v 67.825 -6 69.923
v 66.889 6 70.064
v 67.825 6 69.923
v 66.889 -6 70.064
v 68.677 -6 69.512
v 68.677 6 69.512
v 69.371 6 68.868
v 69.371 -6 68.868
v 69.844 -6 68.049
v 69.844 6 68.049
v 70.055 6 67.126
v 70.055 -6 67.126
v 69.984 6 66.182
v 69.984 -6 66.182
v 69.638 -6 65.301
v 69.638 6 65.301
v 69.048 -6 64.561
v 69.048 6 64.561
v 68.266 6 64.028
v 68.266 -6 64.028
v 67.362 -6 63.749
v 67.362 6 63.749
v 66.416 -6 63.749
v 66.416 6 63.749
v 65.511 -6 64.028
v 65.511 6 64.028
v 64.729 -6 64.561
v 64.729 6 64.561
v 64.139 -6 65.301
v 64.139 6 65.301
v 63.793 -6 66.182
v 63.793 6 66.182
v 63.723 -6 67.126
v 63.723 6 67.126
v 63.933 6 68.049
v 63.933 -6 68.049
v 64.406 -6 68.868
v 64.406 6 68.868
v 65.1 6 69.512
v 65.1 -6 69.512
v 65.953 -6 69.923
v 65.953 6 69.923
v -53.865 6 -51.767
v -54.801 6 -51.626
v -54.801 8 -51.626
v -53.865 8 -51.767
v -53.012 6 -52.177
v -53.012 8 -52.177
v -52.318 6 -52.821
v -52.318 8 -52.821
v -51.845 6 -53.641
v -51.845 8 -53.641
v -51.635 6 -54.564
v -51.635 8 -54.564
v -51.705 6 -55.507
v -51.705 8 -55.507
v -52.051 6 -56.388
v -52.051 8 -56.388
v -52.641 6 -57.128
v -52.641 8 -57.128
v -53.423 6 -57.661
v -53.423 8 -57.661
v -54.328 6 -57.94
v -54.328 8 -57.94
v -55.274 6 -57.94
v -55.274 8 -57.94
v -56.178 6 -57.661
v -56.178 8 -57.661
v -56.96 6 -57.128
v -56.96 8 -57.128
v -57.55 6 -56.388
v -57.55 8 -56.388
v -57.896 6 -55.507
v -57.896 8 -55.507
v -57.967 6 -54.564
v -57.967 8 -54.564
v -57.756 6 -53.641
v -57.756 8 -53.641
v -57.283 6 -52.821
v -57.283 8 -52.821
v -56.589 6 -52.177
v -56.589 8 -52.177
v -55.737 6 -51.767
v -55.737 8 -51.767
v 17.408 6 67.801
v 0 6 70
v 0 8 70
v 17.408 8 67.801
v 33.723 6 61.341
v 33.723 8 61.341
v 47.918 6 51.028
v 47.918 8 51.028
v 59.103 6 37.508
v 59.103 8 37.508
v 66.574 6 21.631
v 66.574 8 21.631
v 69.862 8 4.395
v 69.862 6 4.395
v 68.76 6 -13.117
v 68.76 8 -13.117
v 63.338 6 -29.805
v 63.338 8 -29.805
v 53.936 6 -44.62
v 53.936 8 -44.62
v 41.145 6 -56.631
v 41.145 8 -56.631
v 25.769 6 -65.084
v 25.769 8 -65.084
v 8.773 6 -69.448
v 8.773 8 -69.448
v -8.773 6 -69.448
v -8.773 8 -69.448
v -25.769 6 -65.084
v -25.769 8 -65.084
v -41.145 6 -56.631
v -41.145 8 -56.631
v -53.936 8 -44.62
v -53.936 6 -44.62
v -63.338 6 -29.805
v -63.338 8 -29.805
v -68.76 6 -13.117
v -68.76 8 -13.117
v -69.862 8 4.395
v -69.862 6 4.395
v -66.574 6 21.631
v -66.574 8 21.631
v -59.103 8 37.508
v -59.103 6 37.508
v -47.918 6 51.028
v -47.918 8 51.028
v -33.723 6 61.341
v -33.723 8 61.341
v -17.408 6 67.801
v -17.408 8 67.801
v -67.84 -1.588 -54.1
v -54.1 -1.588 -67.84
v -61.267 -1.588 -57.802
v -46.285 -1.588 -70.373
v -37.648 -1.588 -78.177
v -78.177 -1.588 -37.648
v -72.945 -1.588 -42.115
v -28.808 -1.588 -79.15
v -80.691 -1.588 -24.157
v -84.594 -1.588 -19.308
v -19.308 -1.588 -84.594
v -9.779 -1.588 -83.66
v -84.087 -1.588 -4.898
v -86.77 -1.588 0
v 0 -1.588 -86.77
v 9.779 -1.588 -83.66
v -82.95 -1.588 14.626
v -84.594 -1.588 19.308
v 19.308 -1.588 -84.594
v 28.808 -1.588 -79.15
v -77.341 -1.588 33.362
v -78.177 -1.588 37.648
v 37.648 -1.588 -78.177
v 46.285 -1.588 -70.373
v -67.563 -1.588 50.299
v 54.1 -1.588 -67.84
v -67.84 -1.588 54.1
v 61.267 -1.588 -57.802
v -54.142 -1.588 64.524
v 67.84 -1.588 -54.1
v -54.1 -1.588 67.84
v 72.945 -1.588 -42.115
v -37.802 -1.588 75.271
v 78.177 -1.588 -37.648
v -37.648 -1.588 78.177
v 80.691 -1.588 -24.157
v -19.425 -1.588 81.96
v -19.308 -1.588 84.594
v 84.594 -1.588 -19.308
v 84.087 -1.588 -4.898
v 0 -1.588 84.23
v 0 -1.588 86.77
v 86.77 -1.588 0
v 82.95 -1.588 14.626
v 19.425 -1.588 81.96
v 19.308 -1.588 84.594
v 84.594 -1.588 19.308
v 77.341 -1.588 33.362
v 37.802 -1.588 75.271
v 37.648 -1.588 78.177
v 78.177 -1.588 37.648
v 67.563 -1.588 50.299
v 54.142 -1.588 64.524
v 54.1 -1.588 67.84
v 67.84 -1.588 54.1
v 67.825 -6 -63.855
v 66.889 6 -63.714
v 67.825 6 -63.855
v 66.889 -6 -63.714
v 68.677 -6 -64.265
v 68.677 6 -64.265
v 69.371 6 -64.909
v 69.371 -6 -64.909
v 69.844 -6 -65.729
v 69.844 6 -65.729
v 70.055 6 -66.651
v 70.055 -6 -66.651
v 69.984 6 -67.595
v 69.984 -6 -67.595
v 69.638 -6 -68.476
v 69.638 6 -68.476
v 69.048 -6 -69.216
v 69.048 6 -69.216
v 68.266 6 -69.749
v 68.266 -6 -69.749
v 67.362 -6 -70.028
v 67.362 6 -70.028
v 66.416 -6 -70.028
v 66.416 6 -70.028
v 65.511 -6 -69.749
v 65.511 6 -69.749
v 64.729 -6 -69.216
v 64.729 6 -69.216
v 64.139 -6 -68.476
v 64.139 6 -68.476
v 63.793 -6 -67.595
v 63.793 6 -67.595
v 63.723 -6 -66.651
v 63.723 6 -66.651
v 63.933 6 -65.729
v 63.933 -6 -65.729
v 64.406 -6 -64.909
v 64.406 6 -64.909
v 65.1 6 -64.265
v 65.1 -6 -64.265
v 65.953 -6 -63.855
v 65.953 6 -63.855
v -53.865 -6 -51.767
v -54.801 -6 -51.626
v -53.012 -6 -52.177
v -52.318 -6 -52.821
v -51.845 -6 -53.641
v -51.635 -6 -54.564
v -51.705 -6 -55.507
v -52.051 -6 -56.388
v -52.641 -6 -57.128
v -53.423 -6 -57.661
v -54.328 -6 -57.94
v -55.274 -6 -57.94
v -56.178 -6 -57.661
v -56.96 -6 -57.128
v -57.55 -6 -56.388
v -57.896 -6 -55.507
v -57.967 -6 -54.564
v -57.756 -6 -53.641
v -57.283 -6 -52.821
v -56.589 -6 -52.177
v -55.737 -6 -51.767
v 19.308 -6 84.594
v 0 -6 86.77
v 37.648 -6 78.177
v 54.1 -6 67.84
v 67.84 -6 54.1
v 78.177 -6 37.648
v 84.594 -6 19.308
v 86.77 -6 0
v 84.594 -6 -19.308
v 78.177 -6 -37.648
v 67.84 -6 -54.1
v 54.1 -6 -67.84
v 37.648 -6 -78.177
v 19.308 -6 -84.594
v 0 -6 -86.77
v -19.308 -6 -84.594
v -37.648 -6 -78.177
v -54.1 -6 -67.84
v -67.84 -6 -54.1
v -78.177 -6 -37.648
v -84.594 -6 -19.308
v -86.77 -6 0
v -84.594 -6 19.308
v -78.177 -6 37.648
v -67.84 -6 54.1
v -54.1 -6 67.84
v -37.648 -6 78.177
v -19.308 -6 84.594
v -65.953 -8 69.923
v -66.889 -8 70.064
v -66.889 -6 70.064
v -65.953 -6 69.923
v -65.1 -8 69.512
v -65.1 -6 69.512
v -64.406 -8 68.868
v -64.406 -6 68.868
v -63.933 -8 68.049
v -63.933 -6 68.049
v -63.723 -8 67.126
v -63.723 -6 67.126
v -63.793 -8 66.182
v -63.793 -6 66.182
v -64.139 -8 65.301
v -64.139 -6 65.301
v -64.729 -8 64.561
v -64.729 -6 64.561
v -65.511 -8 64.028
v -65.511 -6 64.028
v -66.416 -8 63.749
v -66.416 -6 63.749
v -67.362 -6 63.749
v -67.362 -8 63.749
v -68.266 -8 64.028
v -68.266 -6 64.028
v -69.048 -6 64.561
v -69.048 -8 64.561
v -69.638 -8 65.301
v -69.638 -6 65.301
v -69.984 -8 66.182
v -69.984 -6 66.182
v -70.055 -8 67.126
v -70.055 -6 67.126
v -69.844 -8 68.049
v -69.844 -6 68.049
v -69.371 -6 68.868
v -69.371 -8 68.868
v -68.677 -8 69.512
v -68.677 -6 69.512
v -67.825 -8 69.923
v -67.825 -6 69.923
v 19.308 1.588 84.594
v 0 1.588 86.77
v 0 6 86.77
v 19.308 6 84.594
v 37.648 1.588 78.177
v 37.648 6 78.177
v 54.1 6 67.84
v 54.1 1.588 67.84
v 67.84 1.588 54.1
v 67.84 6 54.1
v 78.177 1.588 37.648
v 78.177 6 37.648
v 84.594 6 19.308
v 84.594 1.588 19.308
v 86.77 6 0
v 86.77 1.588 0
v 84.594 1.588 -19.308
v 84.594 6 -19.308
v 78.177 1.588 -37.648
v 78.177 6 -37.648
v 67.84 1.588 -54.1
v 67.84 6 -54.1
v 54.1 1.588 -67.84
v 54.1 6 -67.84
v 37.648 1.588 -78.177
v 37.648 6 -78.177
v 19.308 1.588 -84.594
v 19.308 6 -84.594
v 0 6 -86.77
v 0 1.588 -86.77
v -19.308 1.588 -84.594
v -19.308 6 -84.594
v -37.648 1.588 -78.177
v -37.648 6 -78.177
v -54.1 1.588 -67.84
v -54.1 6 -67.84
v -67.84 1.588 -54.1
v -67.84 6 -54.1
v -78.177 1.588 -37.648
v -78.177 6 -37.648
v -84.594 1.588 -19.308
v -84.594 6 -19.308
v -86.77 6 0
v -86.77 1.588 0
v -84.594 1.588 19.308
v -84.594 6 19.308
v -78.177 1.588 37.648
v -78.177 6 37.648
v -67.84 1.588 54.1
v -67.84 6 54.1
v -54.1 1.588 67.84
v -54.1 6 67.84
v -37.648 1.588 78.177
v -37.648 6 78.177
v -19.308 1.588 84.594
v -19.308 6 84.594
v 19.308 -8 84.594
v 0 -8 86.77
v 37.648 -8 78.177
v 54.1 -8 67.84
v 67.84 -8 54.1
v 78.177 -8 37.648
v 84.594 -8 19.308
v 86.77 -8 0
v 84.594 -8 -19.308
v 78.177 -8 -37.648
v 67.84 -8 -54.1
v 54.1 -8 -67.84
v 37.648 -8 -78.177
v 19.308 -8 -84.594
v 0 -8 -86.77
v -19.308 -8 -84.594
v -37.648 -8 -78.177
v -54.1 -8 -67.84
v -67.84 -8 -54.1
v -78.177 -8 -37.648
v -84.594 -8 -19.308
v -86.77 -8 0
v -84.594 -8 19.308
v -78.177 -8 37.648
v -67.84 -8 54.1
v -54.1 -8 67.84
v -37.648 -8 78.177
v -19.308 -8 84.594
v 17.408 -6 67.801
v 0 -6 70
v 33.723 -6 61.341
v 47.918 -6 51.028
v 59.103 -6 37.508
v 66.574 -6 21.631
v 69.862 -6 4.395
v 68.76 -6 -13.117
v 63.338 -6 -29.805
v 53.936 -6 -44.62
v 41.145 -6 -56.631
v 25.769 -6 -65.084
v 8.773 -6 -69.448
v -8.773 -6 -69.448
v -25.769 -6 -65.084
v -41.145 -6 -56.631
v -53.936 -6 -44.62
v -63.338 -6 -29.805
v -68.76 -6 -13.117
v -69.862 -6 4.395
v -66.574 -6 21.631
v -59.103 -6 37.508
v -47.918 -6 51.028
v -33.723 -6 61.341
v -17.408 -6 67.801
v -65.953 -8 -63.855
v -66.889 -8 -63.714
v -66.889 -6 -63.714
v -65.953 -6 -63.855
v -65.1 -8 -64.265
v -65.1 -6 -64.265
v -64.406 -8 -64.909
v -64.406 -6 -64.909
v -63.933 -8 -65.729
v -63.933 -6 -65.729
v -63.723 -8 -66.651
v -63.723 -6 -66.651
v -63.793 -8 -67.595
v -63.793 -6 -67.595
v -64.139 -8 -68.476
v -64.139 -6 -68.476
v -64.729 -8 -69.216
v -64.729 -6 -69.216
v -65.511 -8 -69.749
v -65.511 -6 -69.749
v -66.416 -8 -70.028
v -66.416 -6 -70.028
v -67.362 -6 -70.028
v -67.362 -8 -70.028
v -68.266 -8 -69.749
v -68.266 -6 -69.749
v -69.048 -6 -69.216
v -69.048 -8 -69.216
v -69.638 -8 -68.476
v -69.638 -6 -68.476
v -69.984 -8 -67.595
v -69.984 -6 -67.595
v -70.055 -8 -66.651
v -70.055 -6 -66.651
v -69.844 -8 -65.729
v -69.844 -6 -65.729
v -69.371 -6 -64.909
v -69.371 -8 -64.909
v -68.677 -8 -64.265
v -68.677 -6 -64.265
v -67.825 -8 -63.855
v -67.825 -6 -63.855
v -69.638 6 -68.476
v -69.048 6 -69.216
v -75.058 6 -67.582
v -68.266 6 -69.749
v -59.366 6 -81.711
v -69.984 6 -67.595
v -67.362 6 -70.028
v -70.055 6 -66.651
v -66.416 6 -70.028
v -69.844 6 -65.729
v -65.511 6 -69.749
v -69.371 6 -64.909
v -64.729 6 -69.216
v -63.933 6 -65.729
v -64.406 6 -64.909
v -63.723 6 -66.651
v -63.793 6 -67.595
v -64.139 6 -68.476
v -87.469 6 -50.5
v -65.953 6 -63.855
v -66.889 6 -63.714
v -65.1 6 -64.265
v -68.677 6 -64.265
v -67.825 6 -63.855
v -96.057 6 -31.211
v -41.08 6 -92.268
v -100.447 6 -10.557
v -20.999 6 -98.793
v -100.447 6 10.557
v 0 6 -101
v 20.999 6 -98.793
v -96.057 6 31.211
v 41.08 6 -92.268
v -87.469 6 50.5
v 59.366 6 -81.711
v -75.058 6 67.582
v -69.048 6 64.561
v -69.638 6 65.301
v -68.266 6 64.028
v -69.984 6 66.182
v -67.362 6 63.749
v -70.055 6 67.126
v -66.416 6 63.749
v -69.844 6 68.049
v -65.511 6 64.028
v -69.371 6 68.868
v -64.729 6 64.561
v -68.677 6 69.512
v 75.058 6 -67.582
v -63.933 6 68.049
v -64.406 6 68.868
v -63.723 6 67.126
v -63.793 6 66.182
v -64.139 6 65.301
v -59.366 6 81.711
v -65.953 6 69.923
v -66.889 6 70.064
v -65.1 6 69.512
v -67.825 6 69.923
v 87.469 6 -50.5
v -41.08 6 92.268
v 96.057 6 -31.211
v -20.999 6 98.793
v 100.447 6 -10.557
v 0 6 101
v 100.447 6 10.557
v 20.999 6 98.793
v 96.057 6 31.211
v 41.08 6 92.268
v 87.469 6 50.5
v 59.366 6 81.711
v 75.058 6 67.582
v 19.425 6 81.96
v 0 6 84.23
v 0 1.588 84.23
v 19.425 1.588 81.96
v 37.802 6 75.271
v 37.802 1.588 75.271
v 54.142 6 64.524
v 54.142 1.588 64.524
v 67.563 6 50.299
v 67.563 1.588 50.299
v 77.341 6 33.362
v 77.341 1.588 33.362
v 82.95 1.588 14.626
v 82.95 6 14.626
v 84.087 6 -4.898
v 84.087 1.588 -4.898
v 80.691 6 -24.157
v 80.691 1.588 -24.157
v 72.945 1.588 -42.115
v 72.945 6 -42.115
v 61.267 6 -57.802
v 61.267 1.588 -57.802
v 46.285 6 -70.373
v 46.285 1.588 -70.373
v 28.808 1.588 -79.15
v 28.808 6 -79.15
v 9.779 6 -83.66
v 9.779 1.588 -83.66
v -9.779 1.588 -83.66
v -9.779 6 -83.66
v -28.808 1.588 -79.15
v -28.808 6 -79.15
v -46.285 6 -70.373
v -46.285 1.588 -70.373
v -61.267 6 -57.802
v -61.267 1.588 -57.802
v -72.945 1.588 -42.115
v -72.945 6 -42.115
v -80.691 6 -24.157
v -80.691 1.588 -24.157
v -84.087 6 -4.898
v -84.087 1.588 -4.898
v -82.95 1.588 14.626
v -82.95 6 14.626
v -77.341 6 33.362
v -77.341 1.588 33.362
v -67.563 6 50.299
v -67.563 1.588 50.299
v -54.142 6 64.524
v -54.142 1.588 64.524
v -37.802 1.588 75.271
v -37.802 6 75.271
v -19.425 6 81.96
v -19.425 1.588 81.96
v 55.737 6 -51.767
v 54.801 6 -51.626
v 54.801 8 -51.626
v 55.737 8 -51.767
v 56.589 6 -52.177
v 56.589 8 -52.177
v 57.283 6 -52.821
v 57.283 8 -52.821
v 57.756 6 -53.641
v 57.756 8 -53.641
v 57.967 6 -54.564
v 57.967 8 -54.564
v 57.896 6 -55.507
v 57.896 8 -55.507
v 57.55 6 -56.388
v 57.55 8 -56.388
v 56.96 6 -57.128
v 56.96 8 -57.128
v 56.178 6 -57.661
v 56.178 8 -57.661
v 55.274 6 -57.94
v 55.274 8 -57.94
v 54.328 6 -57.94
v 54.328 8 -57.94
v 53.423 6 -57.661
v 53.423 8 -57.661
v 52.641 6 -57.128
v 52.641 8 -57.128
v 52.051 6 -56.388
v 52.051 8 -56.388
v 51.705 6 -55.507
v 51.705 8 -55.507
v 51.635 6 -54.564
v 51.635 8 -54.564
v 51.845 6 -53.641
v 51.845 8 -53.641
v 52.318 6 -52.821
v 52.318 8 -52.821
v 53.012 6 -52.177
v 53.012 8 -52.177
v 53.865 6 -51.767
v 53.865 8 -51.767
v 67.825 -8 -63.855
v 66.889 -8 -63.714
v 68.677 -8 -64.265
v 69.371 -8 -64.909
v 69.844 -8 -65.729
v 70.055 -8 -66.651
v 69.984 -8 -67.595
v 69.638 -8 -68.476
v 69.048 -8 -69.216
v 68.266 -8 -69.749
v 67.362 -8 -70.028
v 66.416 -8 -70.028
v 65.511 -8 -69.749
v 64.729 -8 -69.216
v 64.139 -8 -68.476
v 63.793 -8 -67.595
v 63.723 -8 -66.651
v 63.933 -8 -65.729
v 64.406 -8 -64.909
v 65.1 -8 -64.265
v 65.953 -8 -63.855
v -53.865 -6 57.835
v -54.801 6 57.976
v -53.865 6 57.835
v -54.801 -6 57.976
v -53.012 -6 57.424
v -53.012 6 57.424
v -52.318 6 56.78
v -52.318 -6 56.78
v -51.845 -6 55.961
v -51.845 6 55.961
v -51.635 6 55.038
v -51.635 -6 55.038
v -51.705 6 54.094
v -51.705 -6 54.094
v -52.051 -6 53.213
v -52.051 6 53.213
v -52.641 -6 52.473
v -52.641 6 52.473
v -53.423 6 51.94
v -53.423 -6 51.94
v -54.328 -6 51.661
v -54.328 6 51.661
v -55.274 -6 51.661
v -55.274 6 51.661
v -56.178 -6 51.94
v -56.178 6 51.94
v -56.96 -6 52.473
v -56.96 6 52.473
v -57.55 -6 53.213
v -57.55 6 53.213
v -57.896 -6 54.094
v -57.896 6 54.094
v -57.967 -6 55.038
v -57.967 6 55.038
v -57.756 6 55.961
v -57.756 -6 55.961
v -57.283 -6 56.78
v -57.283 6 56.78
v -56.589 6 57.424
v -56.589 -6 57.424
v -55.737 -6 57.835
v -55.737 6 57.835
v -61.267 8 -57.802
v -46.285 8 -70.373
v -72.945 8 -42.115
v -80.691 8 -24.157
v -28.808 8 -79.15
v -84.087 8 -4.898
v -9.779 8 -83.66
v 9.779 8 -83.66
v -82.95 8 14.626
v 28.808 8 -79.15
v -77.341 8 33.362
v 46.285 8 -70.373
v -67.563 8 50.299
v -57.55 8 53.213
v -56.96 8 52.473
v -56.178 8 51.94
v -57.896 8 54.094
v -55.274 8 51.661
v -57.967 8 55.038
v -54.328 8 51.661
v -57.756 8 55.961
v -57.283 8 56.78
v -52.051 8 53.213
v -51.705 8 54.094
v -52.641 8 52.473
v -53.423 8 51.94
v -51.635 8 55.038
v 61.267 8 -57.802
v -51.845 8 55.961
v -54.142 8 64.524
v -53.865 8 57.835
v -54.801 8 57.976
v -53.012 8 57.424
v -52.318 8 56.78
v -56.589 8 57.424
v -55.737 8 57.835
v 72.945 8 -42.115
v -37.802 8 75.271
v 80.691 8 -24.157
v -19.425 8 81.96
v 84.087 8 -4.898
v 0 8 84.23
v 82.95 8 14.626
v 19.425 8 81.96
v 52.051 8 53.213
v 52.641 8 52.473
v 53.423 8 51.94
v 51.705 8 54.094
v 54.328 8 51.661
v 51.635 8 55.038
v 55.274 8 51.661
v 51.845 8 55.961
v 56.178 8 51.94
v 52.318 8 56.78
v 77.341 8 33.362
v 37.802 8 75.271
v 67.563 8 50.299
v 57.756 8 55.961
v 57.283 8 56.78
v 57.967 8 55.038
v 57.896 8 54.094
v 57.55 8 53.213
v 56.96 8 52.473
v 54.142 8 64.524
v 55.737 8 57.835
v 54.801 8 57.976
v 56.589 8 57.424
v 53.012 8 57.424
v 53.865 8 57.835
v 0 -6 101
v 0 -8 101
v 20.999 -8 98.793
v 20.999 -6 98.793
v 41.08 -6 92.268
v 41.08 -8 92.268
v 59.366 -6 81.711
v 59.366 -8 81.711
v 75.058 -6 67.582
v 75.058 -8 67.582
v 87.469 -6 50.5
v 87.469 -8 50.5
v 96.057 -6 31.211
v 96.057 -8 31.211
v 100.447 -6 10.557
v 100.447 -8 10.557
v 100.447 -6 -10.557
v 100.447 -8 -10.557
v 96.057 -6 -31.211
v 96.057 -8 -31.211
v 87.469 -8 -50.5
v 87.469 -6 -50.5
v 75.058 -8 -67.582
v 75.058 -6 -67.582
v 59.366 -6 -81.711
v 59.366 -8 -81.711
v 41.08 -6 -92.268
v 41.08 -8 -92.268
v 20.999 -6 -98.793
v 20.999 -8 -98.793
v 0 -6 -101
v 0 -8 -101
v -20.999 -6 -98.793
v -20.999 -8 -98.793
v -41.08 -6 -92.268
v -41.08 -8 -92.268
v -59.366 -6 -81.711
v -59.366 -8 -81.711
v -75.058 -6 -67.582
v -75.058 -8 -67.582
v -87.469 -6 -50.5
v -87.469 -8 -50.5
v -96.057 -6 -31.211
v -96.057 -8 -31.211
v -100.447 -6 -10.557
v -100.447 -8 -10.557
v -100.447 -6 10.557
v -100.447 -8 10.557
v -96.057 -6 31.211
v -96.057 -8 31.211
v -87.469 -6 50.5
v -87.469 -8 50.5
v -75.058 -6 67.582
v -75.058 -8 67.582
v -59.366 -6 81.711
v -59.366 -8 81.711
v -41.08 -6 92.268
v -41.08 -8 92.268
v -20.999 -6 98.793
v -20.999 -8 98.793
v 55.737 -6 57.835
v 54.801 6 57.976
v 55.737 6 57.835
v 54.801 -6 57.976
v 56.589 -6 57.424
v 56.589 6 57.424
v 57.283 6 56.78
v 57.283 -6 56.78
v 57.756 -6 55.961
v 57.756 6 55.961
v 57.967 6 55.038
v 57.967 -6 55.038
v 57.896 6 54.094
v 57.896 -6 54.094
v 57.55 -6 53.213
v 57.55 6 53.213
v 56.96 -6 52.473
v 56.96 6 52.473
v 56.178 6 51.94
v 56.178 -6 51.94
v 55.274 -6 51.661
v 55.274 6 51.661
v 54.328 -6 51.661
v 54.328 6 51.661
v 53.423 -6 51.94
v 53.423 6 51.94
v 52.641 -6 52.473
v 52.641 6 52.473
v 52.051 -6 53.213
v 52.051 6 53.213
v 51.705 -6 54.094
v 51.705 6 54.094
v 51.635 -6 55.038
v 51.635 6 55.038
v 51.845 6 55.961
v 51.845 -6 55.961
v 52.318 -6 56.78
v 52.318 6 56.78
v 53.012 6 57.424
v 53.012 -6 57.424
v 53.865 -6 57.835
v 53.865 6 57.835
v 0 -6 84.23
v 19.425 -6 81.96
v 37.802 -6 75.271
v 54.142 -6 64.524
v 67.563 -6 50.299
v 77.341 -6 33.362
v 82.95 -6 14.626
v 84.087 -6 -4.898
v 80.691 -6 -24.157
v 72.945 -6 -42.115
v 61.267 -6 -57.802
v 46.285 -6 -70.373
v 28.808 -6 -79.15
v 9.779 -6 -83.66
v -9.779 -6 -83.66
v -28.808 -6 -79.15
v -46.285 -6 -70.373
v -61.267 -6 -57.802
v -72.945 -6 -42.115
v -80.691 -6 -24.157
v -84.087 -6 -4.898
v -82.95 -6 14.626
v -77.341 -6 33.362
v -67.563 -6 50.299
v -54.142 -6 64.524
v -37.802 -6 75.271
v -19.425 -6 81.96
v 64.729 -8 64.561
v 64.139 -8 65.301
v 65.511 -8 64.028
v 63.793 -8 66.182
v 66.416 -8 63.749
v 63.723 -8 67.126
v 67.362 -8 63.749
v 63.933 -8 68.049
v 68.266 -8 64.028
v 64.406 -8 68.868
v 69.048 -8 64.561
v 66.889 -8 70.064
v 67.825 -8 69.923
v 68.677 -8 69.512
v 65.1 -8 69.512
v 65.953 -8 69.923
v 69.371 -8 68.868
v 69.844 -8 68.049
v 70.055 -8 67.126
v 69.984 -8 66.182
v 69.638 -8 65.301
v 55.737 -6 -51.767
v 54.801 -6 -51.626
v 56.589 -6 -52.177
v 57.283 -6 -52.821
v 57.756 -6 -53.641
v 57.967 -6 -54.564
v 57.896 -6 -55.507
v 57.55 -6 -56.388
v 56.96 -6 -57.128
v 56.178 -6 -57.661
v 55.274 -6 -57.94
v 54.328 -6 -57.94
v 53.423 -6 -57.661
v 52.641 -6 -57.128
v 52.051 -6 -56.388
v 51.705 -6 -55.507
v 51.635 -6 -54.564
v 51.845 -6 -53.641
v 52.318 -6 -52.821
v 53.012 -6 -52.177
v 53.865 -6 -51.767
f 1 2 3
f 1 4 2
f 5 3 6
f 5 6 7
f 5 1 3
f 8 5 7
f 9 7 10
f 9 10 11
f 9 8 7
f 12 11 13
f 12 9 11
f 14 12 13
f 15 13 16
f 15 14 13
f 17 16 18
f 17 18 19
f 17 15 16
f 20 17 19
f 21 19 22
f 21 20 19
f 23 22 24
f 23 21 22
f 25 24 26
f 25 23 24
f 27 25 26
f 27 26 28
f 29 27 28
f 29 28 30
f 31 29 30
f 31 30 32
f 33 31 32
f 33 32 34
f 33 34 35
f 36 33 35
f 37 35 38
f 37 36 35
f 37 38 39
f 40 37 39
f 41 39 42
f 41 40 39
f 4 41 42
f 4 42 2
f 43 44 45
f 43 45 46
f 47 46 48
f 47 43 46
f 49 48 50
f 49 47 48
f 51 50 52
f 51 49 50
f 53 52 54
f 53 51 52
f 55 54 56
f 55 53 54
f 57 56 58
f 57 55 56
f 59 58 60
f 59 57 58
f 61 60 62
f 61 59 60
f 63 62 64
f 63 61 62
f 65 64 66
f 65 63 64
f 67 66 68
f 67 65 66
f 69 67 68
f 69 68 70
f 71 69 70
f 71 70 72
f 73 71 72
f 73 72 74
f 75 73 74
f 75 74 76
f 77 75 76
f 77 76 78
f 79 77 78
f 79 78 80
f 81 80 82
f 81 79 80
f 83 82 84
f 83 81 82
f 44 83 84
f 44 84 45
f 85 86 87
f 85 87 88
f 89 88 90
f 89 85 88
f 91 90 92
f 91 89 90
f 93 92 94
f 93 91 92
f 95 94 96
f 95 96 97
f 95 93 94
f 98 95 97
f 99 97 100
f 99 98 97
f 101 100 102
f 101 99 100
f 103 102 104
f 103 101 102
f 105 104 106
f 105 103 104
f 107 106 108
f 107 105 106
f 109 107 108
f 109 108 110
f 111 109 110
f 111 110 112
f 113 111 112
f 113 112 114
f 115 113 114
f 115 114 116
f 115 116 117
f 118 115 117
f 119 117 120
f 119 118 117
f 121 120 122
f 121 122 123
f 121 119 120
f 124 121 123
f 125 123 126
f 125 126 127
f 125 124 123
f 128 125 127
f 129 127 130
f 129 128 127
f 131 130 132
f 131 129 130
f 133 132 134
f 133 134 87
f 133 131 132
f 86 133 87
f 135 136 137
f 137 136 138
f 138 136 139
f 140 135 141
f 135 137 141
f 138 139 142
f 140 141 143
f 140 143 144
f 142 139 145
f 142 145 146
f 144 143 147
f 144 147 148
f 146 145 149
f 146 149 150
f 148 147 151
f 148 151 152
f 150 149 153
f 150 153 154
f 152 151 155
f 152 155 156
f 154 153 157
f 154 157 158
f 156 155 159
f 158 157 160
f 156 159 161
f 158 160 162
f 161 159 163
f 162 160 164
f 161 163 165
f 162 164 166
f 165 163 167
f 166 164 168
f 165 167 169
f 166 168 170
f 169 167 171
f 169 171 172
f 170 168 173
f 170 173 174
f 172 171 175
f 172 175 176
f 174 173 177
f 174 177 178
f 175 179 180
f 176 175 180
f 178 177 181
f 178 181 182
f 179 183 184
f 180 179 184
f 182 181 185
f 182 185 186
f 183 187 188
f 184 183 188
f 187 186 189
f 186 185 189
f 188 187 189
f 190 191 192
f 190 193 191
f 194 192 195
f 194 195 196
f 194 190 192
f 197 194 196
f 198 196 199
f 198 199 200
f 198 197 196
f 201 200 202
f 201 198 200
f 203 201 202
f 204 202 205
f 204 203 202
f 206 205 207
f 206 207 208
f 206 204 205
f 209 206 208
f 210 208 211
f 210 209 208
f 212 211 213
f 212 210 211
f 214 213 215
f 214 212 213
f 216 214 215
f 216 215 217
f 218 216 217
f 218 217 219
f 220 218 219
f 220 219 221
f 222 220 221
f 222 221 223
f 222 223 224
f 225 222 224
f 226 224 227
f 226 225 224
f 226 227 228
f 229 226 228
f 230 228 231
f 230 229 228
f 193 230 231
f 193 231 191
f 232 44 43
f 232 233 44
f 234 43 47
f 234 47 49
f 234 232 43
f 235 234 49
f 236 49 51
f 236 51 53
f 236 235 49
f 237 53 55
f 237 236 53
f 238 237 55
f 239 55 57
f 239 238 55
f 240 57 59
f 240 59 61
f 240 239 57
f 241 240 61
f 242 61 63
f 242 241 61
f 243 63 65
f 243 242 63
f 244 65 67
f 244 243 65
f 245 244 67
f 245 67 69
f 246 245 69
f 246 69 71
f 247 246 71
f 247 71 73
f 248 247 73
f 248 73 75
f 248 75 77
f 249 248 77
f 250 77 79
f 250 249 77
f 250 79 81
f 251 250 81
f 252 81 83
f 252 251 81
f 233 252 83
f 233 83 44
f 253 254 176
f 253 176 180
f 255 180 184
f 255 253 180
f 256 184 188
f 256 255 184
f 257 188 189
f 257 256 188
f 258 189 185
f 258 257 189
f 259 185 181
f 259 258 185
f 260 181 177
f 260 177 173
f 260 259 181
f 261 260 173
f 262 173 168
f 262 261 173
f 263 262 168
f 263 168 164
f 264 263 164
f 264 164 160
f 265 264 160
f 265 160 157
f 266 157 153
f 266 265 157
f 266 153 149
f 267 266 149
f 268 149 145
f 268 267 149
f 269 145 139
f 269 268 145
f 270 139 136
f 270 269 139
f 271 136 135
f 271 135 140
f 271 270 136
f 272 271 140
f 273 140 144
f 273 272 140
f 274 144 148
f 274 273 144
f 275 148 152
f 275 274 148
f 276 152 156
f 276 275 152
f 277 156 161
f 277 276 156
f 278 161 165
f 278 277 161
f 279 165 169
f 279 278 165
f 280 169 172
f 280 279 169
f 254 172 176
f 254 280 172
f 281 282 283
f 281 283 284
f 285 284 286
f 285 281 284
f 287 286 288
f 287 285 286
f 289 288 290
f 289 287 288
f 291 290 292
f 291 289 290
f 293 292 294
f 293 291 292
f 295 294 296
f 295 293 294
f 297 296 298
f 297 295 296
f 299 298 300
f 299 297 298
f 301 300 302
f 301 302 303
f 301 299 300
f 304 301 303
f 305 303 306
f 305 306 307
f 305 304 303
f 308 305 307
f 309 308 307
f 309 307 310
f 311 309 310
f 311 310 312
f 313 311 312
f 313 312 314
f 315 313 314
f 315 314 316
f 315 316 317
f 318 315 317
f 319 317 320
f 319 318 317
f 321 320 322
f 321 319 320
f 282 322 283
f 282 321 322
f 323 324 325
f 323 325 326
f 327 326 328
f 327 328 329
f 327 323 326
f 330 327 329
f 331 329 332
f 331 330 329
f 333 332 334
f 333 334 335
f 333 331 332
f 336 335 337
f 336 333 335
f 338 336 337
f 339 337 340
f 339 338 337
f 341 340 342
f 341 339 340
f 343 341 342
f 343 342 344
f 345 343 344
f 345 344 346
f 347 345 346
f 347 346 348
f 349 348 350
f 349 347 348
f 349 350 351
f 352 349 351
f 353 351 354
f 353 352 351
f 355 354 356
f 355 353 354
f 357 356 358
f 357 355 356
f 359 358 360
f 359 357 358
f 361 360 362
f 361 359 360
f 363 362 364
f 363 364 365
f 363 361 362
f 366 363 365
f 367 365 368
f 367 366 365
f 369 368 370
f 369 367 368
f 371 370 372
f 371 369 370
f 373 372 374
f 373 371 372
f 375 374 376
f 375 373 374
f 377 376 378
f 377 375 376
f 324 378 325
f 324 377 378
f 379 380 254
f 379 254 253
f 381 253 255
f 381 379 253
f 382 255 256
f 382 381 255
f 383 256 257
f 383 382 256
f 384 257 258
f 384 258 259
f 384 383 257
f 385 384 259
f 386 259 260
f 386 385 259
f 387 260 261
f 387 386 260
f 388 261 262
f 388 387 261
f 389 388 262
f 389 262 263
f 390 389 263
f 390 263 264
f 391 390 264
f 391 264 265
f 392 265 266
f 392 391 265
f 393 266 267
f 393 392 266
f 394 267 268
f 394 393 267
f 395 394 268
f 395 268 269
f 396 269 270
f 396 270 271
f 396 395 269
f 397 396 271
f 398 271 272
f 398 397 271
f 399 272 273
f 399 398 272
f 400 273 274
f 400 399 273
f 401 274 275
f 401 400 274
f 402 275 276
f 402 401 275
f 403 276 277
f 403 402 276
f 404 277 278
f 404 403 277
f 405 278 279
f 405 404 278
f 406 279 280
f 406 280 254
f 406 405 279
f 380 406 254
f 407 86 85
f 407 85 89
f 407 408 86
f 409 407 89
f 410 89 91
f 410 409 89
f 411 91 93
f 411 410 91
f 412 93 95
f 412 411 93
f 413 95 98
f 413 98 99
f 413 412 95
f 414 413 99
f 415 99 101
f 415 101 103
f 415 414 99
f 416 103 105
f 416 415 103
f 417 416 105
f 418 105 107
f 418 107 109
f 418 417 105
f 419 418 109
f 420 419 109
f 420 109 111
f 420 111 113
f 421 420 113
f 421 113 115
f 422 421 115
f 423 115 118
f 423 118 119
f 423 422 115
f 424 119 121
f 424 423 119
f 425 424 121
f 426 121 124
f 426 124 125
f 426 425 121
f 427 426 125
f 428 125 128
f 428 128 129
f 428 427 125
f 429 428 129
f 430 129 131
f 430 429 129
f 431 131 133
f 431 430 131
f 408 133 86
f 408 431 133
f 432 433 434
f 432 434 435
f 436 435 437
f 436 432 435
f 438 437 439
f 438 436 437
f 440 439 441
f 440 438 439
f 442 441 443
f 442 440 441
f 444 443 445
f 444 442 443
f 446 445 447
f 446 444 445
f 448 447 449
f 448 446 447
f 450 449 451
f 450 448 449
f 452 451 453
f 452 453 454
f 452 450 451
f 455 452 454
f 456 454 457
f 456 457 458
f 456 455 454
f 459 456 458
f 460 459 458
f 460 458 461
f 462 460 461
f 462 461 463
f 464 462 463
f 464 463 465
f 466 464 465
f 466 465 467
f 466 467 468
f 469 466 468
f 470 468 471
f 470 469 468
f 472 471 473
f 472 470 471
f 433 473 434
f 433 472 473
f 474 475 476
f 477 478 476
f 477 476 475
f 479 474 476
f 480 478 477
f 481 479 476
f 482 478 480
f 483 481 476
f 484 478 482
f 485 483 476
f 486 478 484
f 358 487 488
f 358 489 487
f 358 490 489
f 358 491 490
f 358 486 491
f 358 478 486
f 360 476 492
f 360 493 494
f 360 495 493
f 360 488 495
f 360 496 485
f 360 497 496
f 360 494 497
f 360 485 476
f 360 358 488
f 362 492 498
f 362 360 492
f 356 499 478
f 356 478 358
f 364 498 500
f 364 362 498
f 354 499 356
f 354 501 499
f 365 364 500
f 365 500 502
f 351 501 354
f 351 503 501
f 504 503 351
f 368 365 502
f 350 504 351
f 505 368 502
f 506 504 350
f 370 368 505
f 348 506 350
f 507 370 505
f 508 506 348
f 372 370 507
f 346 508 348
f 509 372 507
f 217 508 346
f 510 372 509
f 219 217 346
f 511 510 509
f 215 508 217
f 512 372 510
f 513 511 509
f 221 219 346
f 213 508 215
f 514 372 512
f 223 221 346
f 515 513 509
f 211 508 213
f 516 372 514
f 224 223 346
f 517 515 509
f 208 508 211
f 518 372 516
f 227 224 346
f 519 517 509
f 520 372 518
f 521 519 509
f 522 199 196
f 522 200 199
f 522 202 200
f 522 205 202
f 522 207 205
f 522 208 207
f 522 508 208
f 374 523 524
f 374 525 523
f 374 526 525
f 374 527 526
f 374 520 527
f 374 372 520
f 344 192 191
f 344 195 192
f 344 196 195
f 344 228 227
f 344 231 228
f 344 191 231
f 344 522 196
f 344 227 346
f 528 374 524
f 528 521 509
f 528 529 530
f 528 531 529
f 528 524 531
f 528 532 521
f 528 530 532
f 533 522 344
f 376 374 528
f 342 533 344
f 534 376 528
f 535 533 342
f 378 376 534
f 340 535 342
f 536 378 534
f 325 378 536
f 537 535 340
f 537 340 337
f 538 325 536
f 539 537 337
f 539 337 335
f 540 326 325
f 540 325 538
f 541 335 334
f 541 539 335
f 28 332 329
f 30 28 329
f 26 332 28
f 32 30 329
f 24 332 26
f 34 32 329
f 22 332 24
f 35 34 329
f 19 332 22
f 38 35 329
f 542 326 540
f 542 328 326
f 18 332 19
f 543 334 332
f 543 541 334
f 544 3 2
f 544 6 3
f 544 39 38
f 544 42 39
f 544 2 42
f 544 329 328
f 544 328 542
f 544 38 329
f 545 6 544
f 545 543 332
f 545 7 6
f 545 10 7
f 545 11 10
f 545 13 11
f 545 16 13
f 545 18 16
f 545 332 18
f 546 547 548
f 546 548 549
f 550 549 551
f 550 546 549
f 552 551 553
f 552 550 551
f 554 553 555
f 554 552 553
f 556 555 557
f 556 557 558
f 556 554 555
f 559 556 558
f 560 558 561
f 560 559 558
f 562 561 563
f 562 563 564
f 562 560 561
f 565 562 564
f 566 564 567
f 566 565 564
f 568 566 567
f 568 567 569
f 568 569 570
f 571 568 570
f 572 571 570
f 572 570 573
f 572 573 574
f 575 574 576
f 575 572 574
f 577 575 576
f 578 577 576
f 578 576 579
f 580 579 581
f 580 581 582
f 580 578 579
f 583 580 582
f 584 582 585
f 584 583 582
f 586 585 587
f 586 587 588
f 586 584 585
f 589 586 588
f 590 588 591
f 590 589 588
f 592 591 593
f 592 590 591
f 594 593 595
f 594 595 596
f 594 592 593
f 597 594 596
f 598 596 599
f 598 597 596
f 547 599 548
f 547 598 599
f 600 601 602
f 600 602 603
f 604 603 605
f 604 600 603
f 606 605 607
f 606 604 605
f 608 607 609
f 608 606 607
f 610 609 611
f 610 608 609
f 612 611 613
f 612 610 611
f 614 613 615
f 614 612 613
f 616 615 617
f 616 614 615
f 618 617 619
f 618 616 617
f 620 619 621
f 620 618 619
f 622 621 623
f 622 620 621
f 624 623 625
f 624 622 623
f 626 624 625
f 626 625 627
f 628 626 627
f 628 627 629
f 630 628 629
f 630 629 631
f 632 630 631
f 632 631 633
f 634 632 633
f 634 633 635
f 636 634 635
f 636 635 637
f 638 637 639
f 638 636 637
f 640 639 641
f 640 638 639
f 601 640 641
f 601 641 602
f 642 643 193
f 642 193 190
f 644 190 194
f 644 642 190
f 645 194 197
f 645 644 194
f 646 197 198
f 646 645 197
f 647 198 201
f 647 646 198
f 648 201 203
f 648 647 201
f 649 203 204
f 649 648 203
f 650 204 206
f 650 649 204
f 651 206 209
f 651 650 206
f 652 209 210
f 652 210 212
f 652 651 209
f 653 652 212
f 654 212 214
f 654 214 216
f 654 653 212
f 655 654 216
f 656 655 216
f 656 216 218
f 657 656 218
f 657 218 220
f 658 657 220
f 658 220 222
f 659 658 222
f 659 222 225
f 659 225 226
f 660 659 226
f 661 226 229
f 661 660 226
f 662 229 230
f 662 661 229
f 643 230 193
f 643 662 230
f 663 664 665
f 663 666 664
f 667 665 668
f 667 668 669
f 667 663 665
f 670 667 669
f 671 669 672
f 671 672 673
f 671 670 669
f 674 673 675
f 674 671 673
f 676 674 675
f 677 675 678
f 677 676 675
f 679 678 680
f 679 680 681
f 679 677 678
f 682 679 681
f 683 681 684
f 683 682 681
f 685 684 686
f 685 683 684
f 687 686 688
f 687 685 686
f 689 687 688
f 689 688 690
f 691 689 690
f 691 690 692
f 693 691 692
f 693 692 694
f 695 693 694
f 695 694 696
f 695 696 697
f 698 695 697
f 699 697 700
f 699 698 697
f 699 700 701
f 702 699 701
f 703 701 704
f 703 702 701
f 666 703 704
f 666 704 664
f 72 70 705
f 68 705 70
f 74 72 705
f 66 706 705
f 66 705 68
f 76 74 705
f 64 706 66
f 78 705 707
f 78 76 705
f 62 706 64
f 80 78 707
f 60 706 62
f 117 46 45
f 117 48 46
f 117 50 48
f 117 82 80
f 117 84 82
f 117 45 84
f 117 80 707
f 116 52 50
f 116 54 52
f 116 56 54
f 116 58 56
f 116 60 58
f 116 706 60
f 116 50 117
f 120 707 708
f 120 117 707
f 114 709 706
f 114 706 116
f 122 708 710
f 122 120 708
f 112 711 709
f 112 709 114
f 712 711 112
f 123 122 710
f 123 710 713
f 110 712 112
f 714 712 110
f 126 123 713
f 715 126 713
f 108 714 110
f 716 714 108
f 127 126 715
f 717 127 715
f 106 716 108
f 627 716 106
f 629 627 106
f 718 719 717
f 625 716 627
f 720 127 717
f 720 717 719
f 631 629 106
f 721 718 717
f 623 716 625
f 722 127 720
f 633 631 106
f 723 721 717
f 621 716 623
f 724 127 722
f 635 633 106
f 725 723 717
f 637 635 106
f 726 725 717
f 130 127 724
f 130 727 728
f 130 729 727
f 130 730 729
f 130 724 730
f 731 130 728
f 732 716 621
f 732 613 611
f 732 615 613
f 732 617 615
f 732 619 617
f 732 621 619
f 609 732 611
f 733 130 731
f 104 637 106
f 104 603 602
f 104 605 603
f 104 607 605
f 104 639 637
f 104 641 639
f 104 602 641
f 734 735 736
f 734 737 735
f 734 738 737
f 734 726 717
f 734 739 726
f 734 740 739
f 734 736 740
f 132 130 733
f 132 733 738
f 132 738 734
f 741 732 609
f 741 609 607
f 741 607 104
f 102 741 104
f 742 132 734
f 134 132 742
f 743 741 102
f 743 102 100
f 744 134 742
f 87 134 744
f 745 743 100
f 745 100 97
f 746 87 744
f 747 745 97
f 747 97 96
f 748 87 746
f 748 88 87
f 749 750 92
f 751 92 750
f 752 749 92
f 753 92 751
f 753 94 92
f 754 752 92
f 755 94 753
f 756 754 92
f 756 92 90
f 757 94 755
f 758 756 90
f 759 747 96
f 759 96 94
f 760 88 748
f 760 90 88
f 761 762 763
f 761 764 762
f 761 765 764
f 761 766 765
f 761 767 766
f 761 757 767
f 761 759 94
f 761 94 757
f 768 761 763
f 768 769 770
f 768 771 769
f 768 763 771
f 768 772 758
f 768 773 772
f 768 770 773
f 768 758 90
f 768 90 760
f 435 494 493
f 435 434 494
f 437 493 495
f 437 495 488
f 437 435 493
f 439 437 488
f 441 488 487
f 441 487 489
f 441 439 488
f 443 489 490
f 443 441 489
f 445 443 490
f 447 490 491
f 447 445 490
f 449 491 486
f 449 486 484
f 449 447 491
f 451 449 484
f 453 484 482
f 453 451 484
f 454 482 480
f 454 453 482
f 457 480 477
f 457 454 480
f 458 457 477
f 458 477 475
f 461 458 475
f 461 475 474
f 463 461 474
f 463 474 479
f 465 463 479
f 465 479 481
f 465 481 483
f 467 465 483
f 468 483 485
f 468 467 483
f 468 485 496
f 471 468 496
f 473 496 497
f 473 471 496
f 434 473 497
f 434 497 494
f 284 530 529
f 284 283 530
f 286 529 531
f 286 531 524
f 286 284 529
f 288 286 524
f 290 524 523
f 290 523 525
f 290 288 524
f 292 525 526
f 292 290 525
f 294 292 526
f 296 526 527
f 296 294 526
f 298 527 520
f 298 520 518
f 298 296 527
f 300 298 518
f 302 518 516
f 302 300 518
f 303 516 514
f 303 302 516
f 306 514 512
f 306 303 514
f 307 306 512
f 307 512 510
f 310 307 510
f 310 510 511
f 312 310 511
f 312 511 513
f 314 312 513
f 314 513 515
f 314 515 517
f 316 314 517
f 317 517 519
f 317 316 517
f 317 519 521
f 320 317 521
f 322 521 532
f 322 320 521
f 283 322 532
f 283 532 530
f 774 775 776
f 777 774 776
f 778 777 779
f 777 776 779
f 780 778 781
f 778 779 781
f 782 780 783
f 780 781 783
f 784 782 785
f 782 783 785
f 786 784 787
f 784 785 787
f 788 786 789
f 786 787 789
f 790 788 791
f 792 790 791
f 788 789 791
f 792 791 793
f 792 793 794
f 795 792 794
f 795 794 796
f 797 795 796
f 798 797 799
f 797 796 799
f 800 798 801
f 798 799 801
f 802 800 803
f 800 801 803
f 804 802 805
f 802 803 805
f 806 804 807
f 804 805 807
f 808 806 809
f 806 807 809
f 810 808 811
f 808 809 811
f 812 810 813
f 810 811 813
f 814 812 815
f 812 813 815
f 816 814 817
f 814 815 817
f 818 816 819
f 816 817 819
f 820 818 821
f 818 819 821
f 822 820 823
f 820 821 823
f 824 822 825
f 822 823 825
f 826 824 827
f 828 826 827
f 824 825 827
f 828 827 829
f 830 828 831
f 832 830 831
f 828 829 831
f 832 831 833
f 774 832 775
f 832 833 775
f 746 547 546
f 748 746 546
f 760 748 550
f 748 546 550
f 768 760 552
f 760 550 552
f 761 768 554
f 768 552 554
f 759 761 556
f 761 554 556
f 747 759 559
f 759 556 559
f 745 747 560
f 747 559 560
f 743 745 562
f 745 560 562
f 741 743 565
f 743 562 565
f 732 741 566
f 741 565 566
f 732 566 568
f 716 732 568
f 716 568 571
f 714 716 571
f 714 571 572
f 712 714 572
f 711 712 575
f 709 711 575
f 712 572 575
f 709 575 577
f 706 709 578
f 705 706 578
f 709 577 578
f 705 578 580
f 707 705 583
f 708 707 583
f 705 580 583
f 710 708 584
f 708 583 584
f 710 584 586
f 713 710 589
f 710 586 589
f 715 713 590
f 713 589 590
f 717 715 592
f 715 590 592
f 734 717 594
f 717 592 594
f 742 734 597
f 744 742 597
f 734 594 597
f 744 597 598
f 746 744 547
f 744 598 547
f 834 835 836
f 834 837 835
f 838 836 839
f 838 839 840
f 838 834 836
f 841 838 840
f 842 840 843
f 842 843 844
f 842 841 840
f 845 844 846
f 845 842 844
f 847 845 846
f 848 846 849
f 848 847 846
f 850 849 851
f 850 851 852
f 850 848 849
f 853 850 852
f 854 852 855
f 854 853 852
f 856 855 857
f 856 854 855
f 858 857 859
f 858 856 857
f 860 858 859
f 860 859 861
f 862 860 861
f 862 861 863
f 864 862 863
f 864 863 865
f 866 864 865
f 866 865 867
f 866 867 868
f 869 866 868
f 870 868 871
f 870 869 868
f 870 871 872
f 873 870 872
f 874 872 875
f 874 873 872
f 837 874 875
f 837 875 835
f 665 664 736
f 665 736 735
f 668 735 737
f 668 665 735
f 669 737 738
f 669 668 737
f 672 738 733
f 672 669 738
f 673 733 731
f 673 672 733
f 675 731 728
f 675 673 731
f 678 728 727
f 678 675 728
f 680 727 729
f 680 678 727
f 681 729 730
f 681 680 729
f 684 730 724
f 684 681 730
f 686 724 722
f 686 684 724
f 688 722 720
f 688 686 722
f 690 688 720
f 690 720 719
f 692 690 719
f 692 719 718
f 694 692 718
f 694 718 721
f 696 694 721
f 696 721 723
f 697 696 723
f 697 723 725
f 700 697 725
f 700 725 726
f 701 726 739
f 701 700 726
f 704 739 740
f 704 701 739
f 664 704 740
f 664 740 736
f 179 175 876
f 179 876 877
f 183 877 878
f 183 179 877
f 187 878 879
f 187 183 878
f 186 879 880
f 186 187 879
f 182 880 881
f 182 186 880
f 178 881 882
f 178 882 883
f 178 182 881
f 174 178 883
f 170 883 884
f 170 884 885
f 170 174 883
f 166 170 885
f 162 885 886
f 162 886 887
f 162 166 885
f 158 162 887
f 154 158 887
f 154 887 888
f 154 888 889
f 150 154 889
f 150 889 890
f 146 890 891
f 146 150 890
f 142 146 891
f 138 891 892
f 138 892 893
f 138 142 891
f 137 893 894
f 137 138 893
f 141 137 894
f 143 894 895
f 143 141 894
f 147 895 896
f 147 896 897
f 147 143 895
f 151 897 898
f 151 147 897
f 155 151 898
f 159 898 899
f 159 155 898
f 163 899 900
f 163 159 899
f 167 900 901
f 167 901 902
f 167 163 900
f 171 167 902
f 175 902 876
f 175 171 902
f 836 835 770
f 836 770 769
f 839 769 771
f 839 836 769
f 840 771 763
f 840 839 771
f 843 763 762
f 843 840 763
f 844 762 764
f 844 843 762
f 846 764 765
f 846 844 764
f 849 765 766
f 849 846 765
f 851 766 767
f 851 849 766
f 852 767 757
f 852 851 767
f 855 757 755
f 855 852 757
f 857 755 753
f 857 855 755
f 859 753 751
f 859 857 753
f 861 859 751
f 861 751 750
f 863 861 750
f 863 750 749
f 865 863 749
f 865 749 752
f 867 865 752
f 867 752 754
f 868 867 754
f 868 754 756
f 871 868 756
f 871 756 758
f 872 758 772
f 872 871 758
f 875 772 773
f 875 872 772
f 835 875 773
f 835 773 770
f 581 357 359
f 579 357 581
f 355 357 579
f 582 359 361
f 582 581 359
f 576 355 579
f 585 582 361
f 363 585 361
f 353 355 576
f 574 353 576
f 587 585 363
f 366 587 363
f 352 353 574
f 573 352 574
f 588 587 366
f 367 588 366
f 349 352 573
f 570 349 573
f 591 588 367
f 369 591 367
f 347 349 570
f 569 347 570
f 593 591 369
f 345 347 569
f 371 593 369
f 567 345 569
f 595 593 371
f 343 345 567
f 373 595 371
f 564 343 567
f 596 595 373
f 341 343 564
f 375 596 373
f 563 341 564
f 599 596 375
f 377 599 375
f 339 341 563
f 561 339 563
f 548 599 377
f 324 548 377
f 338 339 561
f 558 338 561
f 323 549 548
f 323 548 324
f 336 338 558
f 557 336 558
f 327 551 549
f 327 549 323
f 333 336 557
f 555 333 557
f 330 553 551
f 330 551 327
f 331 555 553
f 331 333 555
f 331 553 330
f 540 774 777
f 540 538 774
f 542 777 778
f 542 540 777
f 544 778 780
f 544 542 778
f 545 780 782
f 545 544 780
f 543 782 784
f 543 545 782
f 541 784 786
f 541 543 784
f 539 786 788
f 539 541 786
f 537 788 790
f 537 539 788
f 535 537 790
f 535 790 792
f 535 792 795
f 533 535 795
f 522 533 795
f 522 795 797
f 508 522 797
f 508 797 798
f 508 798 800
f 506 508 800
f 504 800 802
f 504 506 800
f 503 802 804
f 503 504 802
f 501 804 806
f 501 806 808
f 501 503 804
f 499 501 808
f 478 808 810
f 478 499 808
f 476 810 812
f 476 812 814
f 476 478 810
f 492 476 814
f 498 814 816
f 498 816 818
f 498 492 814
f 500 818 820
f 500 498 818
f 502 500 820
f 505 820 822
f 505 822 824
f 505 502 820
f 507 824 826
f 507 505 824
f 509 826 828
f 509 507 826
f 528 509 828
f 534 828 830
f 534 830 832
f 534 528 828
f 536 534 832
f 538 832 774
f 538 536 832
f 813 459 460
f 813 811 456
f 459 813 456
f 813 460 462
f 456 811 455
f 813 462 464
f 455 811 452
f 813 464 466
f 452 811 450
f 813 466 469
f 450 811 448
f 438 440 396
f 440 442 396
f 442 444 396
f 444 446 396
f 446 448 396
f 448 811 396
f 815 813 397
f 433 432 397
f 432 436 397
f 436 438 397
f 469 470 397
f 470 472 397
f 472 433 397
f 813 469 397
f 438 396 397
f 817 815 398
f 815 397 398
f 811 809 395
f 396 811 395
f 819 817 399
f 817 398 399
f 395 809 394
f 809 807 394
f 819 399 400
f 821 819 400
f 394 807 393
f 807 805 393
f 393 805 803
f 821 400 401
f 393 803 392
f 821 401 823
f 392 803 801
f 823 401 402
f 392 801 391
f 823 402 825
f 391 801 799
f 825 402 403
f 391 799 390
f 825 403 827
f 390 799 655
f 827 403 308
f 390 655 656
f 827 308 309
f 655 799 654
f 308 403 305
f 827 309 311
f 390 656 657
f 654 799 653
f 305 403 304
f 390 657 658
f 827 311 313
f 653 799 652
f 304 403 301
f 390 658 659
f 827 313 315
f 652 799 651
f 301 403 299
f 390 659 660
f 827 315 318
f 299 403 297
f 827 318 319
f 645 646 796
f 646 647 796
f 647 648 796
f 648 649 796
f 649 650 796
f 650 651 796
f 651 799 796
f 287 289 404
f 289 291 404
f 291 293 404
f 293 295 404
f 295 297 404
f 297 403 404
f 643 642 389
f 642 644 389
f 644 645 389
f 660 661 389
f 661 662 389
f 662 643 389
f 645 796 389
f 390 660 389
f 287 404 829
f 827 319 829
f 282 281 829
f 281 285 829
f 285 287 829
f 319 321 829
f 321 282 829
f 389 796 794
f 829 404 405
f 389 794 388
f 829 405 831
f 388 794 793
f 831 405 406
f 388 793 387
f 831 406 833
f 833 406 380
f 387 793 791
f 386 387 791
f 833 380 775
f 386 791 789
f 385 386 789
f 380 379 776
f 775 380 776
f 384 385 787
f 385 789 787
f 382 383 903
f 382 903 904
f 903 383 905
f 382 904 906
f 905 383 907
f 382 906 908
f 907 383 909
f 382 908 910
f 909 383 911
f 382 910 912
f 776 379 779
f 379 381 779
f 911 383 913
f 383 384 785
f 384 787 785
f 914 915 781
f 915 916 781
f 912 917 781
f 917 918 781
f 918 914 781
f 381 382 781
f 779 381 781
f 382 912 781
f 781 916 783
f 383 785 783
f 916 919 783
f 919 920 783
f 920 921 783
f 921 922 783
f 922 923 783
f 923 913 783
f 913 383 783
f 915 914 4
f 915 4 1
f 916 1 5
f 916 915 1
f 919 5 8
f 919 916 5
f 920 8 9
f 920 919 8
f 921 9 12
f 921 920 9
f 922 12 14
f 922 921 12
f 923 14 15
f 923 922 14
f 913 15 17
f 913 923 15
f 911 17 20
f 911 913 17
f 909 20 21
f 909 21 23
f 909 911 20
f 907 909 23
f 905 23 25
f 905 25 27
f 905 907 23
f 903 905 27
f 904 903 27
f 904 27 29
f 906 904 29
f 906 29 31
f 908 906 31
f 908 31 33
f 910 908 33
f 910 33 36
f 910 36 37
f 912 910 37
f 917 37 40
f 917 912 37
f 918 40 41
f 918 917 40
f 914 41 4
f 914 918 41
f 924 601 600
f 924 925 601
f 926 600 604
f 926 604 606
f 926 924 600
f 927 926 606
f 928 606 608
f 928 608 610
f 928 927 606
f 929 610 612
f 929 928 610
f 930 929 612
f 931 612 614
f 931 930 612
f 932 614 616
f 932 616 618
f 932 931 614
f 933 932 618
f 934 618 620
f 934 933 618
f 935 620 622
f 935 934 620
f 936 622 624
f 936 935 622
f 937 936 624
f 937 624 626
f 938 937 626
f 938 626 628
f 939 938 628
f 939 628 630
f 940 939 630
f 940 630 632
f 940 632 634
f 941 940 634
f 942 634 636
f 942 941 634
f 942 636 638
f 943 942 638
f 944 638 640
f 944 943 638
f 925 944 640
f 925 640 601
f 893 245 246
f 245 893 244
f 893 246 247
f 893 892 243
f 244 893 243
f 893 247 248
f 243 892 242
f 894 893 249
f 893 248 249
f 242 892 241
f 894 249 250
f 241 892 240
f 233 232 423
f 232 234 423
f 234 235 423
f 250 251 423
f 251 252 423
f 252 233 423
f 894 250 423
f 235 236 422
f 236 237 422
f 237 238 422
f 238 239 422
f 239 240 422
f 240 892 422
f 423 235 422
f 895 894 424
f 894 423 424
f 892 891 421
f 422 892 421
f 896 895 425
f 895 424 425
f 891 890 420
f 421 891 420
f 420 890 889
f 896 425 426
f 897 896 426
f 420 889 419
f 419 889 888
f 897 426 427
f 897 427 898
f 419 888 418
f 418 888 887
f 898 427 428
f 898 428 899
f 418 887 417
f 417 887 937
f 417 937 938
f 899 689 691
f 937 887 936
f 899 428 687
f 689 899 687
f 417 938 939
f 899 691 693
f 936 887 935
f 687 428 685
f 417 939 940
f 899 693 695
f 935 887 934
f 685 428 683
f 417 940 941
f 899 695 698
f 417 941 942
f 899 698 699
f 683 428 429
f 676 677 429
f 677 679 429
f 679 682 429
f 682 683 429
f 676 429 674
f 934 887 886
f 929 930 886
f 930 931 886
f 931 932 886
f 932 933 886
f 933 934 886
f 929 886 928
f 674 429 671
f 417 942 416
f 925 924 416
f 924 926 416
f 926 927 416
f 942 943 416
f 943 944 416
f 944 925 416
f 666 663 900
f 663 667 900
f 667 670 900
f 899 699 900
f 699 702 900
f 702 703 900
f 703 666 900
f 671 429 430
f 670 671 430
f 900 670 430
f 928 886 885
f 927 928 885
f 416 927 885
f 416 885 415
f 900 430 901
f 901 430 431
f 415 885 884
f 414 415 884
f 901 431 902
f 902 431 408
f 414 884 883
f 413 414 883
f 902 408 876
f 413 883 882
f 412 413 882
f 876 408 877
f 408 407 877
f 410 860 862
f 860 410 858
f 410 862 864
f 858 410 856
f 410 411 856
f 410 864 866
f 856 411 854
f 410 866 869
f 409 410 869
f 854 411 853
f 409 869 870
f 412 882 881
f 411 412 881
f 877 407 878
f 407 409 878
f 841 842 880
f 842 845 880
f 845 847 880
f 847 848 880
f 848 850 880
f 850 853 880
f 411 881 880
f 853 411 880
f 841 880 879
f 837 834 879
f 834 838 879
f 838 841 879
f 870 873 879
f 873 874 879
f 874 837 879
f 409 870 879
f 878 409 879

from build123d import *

# Parameters (mm, degrees)
SKETCH1_R             = 101
SKETCH1_R_2           = 3.175
SKETCH1_R_3           = 86.77
BOSS_EXTRUDE1_DEPTH   = 6
SKETCH1_R_4           = 84.23
SKETCH1_R_5           = 70
BOSS_EXTRUDE1_2_DEPTH = 6
SKETCH1_3_R           = 86.77
SKETCH1_3_R_2         = 84.23
BOSS_EXTRUDE2_DEPTH   = 1.5875
BOSS_EXTRUDE3_START   = 6
SKETCH1_4_R           = 84.23
SKETCH1_4_R_2         = 3.175
SKETCH1_4_R_3         = 70
BOSS_EXTRUDE3_DEPTH   = 2
BOSS_EXTRUDE4_START   = -8
SKETCH1_5_R           = 101
SKETCH1_5_R_2         = 3.175
SKETCH1_5_R_3         = 86.77
BOSS_EXTRUDE4_DEPTH   = 2


with BuildPart() as part:
    # Sketch1 → Boss-Extrude1 (new, symmetric)
    with BuildSketch(Plane(origin=(0, 0, 0), x_dir=(1, 0, 0), z_dir=(0, 1, 0))):
        with Locations(Location((0, 0, 0), (0, 0, 270))):
            Circle(SKETCH1_R)
        with Locations(Location((-66.888765966, -66.888765966, 0), (0, 0, 270))):
            Circle(SKETCH1_R_2, mode=Mode.SUBTRACT)
        with Locations(Location((66.888765966, 66.888765966, 0), (0, 0, 270))):
            Circle(SKETCH1_R_2, mode=Mode.SUBTRACT)
        with Locations(Location((0, 0, 0), (0, 0, 270))):
            Circle(SKETCH1_R_3, mode=Mode.SUBTRACT)
        with Locations(Location((66.888765966, -66.888765966, 0), (0, 0, 270))):
            Circle(SKETCH1_R_2, mode=Mode.SUBTRACT)
        with Locations(Location((-66.888765966, 66.888765966, 0), (0, 0, 270))):
            Circle(SKETCH1_R_2, mode=Mode.SUBTRACT)
    extrude(amount=BOSS_EXTRUDE1_DEPTH, both=True)



with BuildPart() as body_2:
    # Sketch1 → Boss-Extrude1 2 (new, symmetric)
    with BuildSketch(Plane(origin=(0, 0, 0), x_dir=(1, 0, 0), z_dir=(0, 1, 0))):
        with Locations(Location((0, 0, 0), (0, 0, 270))):
            Circle(SKETCH1_R_4)
        with Locations(Location((-54.800775542, 54.800775542, 0), (0, 0, 270))):
            Circle(SKETCH1_R_2, mode=Mode.SUBTRACT)
        with Locations(Location((-54.800775542, -54.800775542, 0), (0, 0, 270))):
            Circle(SKETCH1_R_2, mode=Mode.SUBTRACT)
        with Locations(Location((54.800775542, -54.800775542, 0), (0, 0, 270))):
            Circle(SKETCH1_R_2, mode=Mode.SUBTRACT)
        with Locations(Location((54.800775542, 54.800775542, 0), (0, 0, 270))):
            Circle(SKETCH1_R_2, mode=Mode.SUBTRACT)
        with Locations(Location((0, 0, 0), (0, 0, 270))):
            Circle(SKETCH1_R_5, mode=Mode.SUBTRACT)
    extrude(amount=BOSS_EXTRUDE1_2_DEPTH, both=True)


with BuildPart() as part_1:
    add(part.part)

    add(body_2.part)  # Boss-Extrude2 merges body 2
    # Sketch1<3> → Boss-Extrude2 (add, symmetric)
    with BuildSketch(Plane(origin=(0, 0, 0), x_dir=(1, 0, 0), z_dir=(0, 1, 0))):
        with Locations(Location((0, 0, 0), (0, 0, 270))):
            Circle(SKETCH1_3_R)
        with Locations(Location((0, 0, 0), (0, 0, 270))):
            Circle(SKETCH1_3_R_2, mode=Mode.SUBTRACT)
    extrude(amount=BOSS_EXTRUDE2_DEPTH, both=True)

    # Sketch1<4> → Boss-Extrude3 (add)
    with BuildSketch(Plane(origin=(0, 0, 0), x_dir=(1, 0, 0), z_dir=(0, 1, 0)).offset(BOSS_EXTRUDE3_START)):
        with Locations(Location((0, 0, 0), (0, 0, 270))):
            Circle(SKETCH1_4_R)
        with Locations(Location((-54.800775542, 54.800775542, 0), (0, 0, 270))):
            Circle(SKETCH1_4_R_2, mode=Mode.SUBTRACT)
        with Locations(Location((-54.800775542, -54.800775542, 0), (0, 0, 270))):
            Circle(SKETCH1_4_R_2, mode=Mode.SUBTRACT)
        with Locations(Location((54.800775542, -54.800775542, 0), (0, 0, 270))):
            Circle(SKETCH1_4_R_2, mode=Mode.SUBTRACT)
        with Locations(Location((54.800775542, 54.800775542, 0), (0, 0, 270))):
            Circle(SKETCH1_4_R_2, mode=Mode.SUBTRACT)
        with Locations(Location((0, 0, 0), (0, 0, 270))):
            Circle(SKETCH1_4_R_3, mode=Mode.SUBTRACT)
    extrude(amount=BOSS_EXTRUDE3_DEPTH)

    # Sketch1<5> → Boss-Extrude4 (add)
    with BuildSketch(Plane(origin=(0, 0, 0), x_dir=(1, 0, 0), z_dir=(0, 1, 0)).offset(BOSS_EXTRUDE4_START)):
        with Locations(Location((0, 0, 0), (0, 0, 270))):
            Circle(SKETCH1_5_R)
        with Locations(Location((-66.888765966, -66.888765966, 0), (0, 0, 270))):
            Circle(SKETCH1_5_R_2, mode=Mode.SUBTRACT)
        with Locations(Location((66.888765966, 66.888765966, 0), (0, 0, 270))):
            Circle(SKETCH1_5_R_2, mode=Mode.SUBTRACT)
        with Locations(Location((0, 0, 0), (0, 0, 270))):
            Circle(SKETCH1_5_R_3, mode=Mode.SUBTRACT)
        with Locations(Location((66.888765966, -66.888765966, 0), (0, 0, 270))):
            Circle(SKETCH1_5_R_2, mode=Mode.SUBTRACT)
        with Locations(Location((-66.888765966, 66.888765966, 0), (0, 0, 270))):
            Circle(SKETCH1_5_R_2, mode=Mode.SUBTRACT)
    extrude(amount=BOSS_EXTRUDE4_DEPTH)


solid = part_1.part
